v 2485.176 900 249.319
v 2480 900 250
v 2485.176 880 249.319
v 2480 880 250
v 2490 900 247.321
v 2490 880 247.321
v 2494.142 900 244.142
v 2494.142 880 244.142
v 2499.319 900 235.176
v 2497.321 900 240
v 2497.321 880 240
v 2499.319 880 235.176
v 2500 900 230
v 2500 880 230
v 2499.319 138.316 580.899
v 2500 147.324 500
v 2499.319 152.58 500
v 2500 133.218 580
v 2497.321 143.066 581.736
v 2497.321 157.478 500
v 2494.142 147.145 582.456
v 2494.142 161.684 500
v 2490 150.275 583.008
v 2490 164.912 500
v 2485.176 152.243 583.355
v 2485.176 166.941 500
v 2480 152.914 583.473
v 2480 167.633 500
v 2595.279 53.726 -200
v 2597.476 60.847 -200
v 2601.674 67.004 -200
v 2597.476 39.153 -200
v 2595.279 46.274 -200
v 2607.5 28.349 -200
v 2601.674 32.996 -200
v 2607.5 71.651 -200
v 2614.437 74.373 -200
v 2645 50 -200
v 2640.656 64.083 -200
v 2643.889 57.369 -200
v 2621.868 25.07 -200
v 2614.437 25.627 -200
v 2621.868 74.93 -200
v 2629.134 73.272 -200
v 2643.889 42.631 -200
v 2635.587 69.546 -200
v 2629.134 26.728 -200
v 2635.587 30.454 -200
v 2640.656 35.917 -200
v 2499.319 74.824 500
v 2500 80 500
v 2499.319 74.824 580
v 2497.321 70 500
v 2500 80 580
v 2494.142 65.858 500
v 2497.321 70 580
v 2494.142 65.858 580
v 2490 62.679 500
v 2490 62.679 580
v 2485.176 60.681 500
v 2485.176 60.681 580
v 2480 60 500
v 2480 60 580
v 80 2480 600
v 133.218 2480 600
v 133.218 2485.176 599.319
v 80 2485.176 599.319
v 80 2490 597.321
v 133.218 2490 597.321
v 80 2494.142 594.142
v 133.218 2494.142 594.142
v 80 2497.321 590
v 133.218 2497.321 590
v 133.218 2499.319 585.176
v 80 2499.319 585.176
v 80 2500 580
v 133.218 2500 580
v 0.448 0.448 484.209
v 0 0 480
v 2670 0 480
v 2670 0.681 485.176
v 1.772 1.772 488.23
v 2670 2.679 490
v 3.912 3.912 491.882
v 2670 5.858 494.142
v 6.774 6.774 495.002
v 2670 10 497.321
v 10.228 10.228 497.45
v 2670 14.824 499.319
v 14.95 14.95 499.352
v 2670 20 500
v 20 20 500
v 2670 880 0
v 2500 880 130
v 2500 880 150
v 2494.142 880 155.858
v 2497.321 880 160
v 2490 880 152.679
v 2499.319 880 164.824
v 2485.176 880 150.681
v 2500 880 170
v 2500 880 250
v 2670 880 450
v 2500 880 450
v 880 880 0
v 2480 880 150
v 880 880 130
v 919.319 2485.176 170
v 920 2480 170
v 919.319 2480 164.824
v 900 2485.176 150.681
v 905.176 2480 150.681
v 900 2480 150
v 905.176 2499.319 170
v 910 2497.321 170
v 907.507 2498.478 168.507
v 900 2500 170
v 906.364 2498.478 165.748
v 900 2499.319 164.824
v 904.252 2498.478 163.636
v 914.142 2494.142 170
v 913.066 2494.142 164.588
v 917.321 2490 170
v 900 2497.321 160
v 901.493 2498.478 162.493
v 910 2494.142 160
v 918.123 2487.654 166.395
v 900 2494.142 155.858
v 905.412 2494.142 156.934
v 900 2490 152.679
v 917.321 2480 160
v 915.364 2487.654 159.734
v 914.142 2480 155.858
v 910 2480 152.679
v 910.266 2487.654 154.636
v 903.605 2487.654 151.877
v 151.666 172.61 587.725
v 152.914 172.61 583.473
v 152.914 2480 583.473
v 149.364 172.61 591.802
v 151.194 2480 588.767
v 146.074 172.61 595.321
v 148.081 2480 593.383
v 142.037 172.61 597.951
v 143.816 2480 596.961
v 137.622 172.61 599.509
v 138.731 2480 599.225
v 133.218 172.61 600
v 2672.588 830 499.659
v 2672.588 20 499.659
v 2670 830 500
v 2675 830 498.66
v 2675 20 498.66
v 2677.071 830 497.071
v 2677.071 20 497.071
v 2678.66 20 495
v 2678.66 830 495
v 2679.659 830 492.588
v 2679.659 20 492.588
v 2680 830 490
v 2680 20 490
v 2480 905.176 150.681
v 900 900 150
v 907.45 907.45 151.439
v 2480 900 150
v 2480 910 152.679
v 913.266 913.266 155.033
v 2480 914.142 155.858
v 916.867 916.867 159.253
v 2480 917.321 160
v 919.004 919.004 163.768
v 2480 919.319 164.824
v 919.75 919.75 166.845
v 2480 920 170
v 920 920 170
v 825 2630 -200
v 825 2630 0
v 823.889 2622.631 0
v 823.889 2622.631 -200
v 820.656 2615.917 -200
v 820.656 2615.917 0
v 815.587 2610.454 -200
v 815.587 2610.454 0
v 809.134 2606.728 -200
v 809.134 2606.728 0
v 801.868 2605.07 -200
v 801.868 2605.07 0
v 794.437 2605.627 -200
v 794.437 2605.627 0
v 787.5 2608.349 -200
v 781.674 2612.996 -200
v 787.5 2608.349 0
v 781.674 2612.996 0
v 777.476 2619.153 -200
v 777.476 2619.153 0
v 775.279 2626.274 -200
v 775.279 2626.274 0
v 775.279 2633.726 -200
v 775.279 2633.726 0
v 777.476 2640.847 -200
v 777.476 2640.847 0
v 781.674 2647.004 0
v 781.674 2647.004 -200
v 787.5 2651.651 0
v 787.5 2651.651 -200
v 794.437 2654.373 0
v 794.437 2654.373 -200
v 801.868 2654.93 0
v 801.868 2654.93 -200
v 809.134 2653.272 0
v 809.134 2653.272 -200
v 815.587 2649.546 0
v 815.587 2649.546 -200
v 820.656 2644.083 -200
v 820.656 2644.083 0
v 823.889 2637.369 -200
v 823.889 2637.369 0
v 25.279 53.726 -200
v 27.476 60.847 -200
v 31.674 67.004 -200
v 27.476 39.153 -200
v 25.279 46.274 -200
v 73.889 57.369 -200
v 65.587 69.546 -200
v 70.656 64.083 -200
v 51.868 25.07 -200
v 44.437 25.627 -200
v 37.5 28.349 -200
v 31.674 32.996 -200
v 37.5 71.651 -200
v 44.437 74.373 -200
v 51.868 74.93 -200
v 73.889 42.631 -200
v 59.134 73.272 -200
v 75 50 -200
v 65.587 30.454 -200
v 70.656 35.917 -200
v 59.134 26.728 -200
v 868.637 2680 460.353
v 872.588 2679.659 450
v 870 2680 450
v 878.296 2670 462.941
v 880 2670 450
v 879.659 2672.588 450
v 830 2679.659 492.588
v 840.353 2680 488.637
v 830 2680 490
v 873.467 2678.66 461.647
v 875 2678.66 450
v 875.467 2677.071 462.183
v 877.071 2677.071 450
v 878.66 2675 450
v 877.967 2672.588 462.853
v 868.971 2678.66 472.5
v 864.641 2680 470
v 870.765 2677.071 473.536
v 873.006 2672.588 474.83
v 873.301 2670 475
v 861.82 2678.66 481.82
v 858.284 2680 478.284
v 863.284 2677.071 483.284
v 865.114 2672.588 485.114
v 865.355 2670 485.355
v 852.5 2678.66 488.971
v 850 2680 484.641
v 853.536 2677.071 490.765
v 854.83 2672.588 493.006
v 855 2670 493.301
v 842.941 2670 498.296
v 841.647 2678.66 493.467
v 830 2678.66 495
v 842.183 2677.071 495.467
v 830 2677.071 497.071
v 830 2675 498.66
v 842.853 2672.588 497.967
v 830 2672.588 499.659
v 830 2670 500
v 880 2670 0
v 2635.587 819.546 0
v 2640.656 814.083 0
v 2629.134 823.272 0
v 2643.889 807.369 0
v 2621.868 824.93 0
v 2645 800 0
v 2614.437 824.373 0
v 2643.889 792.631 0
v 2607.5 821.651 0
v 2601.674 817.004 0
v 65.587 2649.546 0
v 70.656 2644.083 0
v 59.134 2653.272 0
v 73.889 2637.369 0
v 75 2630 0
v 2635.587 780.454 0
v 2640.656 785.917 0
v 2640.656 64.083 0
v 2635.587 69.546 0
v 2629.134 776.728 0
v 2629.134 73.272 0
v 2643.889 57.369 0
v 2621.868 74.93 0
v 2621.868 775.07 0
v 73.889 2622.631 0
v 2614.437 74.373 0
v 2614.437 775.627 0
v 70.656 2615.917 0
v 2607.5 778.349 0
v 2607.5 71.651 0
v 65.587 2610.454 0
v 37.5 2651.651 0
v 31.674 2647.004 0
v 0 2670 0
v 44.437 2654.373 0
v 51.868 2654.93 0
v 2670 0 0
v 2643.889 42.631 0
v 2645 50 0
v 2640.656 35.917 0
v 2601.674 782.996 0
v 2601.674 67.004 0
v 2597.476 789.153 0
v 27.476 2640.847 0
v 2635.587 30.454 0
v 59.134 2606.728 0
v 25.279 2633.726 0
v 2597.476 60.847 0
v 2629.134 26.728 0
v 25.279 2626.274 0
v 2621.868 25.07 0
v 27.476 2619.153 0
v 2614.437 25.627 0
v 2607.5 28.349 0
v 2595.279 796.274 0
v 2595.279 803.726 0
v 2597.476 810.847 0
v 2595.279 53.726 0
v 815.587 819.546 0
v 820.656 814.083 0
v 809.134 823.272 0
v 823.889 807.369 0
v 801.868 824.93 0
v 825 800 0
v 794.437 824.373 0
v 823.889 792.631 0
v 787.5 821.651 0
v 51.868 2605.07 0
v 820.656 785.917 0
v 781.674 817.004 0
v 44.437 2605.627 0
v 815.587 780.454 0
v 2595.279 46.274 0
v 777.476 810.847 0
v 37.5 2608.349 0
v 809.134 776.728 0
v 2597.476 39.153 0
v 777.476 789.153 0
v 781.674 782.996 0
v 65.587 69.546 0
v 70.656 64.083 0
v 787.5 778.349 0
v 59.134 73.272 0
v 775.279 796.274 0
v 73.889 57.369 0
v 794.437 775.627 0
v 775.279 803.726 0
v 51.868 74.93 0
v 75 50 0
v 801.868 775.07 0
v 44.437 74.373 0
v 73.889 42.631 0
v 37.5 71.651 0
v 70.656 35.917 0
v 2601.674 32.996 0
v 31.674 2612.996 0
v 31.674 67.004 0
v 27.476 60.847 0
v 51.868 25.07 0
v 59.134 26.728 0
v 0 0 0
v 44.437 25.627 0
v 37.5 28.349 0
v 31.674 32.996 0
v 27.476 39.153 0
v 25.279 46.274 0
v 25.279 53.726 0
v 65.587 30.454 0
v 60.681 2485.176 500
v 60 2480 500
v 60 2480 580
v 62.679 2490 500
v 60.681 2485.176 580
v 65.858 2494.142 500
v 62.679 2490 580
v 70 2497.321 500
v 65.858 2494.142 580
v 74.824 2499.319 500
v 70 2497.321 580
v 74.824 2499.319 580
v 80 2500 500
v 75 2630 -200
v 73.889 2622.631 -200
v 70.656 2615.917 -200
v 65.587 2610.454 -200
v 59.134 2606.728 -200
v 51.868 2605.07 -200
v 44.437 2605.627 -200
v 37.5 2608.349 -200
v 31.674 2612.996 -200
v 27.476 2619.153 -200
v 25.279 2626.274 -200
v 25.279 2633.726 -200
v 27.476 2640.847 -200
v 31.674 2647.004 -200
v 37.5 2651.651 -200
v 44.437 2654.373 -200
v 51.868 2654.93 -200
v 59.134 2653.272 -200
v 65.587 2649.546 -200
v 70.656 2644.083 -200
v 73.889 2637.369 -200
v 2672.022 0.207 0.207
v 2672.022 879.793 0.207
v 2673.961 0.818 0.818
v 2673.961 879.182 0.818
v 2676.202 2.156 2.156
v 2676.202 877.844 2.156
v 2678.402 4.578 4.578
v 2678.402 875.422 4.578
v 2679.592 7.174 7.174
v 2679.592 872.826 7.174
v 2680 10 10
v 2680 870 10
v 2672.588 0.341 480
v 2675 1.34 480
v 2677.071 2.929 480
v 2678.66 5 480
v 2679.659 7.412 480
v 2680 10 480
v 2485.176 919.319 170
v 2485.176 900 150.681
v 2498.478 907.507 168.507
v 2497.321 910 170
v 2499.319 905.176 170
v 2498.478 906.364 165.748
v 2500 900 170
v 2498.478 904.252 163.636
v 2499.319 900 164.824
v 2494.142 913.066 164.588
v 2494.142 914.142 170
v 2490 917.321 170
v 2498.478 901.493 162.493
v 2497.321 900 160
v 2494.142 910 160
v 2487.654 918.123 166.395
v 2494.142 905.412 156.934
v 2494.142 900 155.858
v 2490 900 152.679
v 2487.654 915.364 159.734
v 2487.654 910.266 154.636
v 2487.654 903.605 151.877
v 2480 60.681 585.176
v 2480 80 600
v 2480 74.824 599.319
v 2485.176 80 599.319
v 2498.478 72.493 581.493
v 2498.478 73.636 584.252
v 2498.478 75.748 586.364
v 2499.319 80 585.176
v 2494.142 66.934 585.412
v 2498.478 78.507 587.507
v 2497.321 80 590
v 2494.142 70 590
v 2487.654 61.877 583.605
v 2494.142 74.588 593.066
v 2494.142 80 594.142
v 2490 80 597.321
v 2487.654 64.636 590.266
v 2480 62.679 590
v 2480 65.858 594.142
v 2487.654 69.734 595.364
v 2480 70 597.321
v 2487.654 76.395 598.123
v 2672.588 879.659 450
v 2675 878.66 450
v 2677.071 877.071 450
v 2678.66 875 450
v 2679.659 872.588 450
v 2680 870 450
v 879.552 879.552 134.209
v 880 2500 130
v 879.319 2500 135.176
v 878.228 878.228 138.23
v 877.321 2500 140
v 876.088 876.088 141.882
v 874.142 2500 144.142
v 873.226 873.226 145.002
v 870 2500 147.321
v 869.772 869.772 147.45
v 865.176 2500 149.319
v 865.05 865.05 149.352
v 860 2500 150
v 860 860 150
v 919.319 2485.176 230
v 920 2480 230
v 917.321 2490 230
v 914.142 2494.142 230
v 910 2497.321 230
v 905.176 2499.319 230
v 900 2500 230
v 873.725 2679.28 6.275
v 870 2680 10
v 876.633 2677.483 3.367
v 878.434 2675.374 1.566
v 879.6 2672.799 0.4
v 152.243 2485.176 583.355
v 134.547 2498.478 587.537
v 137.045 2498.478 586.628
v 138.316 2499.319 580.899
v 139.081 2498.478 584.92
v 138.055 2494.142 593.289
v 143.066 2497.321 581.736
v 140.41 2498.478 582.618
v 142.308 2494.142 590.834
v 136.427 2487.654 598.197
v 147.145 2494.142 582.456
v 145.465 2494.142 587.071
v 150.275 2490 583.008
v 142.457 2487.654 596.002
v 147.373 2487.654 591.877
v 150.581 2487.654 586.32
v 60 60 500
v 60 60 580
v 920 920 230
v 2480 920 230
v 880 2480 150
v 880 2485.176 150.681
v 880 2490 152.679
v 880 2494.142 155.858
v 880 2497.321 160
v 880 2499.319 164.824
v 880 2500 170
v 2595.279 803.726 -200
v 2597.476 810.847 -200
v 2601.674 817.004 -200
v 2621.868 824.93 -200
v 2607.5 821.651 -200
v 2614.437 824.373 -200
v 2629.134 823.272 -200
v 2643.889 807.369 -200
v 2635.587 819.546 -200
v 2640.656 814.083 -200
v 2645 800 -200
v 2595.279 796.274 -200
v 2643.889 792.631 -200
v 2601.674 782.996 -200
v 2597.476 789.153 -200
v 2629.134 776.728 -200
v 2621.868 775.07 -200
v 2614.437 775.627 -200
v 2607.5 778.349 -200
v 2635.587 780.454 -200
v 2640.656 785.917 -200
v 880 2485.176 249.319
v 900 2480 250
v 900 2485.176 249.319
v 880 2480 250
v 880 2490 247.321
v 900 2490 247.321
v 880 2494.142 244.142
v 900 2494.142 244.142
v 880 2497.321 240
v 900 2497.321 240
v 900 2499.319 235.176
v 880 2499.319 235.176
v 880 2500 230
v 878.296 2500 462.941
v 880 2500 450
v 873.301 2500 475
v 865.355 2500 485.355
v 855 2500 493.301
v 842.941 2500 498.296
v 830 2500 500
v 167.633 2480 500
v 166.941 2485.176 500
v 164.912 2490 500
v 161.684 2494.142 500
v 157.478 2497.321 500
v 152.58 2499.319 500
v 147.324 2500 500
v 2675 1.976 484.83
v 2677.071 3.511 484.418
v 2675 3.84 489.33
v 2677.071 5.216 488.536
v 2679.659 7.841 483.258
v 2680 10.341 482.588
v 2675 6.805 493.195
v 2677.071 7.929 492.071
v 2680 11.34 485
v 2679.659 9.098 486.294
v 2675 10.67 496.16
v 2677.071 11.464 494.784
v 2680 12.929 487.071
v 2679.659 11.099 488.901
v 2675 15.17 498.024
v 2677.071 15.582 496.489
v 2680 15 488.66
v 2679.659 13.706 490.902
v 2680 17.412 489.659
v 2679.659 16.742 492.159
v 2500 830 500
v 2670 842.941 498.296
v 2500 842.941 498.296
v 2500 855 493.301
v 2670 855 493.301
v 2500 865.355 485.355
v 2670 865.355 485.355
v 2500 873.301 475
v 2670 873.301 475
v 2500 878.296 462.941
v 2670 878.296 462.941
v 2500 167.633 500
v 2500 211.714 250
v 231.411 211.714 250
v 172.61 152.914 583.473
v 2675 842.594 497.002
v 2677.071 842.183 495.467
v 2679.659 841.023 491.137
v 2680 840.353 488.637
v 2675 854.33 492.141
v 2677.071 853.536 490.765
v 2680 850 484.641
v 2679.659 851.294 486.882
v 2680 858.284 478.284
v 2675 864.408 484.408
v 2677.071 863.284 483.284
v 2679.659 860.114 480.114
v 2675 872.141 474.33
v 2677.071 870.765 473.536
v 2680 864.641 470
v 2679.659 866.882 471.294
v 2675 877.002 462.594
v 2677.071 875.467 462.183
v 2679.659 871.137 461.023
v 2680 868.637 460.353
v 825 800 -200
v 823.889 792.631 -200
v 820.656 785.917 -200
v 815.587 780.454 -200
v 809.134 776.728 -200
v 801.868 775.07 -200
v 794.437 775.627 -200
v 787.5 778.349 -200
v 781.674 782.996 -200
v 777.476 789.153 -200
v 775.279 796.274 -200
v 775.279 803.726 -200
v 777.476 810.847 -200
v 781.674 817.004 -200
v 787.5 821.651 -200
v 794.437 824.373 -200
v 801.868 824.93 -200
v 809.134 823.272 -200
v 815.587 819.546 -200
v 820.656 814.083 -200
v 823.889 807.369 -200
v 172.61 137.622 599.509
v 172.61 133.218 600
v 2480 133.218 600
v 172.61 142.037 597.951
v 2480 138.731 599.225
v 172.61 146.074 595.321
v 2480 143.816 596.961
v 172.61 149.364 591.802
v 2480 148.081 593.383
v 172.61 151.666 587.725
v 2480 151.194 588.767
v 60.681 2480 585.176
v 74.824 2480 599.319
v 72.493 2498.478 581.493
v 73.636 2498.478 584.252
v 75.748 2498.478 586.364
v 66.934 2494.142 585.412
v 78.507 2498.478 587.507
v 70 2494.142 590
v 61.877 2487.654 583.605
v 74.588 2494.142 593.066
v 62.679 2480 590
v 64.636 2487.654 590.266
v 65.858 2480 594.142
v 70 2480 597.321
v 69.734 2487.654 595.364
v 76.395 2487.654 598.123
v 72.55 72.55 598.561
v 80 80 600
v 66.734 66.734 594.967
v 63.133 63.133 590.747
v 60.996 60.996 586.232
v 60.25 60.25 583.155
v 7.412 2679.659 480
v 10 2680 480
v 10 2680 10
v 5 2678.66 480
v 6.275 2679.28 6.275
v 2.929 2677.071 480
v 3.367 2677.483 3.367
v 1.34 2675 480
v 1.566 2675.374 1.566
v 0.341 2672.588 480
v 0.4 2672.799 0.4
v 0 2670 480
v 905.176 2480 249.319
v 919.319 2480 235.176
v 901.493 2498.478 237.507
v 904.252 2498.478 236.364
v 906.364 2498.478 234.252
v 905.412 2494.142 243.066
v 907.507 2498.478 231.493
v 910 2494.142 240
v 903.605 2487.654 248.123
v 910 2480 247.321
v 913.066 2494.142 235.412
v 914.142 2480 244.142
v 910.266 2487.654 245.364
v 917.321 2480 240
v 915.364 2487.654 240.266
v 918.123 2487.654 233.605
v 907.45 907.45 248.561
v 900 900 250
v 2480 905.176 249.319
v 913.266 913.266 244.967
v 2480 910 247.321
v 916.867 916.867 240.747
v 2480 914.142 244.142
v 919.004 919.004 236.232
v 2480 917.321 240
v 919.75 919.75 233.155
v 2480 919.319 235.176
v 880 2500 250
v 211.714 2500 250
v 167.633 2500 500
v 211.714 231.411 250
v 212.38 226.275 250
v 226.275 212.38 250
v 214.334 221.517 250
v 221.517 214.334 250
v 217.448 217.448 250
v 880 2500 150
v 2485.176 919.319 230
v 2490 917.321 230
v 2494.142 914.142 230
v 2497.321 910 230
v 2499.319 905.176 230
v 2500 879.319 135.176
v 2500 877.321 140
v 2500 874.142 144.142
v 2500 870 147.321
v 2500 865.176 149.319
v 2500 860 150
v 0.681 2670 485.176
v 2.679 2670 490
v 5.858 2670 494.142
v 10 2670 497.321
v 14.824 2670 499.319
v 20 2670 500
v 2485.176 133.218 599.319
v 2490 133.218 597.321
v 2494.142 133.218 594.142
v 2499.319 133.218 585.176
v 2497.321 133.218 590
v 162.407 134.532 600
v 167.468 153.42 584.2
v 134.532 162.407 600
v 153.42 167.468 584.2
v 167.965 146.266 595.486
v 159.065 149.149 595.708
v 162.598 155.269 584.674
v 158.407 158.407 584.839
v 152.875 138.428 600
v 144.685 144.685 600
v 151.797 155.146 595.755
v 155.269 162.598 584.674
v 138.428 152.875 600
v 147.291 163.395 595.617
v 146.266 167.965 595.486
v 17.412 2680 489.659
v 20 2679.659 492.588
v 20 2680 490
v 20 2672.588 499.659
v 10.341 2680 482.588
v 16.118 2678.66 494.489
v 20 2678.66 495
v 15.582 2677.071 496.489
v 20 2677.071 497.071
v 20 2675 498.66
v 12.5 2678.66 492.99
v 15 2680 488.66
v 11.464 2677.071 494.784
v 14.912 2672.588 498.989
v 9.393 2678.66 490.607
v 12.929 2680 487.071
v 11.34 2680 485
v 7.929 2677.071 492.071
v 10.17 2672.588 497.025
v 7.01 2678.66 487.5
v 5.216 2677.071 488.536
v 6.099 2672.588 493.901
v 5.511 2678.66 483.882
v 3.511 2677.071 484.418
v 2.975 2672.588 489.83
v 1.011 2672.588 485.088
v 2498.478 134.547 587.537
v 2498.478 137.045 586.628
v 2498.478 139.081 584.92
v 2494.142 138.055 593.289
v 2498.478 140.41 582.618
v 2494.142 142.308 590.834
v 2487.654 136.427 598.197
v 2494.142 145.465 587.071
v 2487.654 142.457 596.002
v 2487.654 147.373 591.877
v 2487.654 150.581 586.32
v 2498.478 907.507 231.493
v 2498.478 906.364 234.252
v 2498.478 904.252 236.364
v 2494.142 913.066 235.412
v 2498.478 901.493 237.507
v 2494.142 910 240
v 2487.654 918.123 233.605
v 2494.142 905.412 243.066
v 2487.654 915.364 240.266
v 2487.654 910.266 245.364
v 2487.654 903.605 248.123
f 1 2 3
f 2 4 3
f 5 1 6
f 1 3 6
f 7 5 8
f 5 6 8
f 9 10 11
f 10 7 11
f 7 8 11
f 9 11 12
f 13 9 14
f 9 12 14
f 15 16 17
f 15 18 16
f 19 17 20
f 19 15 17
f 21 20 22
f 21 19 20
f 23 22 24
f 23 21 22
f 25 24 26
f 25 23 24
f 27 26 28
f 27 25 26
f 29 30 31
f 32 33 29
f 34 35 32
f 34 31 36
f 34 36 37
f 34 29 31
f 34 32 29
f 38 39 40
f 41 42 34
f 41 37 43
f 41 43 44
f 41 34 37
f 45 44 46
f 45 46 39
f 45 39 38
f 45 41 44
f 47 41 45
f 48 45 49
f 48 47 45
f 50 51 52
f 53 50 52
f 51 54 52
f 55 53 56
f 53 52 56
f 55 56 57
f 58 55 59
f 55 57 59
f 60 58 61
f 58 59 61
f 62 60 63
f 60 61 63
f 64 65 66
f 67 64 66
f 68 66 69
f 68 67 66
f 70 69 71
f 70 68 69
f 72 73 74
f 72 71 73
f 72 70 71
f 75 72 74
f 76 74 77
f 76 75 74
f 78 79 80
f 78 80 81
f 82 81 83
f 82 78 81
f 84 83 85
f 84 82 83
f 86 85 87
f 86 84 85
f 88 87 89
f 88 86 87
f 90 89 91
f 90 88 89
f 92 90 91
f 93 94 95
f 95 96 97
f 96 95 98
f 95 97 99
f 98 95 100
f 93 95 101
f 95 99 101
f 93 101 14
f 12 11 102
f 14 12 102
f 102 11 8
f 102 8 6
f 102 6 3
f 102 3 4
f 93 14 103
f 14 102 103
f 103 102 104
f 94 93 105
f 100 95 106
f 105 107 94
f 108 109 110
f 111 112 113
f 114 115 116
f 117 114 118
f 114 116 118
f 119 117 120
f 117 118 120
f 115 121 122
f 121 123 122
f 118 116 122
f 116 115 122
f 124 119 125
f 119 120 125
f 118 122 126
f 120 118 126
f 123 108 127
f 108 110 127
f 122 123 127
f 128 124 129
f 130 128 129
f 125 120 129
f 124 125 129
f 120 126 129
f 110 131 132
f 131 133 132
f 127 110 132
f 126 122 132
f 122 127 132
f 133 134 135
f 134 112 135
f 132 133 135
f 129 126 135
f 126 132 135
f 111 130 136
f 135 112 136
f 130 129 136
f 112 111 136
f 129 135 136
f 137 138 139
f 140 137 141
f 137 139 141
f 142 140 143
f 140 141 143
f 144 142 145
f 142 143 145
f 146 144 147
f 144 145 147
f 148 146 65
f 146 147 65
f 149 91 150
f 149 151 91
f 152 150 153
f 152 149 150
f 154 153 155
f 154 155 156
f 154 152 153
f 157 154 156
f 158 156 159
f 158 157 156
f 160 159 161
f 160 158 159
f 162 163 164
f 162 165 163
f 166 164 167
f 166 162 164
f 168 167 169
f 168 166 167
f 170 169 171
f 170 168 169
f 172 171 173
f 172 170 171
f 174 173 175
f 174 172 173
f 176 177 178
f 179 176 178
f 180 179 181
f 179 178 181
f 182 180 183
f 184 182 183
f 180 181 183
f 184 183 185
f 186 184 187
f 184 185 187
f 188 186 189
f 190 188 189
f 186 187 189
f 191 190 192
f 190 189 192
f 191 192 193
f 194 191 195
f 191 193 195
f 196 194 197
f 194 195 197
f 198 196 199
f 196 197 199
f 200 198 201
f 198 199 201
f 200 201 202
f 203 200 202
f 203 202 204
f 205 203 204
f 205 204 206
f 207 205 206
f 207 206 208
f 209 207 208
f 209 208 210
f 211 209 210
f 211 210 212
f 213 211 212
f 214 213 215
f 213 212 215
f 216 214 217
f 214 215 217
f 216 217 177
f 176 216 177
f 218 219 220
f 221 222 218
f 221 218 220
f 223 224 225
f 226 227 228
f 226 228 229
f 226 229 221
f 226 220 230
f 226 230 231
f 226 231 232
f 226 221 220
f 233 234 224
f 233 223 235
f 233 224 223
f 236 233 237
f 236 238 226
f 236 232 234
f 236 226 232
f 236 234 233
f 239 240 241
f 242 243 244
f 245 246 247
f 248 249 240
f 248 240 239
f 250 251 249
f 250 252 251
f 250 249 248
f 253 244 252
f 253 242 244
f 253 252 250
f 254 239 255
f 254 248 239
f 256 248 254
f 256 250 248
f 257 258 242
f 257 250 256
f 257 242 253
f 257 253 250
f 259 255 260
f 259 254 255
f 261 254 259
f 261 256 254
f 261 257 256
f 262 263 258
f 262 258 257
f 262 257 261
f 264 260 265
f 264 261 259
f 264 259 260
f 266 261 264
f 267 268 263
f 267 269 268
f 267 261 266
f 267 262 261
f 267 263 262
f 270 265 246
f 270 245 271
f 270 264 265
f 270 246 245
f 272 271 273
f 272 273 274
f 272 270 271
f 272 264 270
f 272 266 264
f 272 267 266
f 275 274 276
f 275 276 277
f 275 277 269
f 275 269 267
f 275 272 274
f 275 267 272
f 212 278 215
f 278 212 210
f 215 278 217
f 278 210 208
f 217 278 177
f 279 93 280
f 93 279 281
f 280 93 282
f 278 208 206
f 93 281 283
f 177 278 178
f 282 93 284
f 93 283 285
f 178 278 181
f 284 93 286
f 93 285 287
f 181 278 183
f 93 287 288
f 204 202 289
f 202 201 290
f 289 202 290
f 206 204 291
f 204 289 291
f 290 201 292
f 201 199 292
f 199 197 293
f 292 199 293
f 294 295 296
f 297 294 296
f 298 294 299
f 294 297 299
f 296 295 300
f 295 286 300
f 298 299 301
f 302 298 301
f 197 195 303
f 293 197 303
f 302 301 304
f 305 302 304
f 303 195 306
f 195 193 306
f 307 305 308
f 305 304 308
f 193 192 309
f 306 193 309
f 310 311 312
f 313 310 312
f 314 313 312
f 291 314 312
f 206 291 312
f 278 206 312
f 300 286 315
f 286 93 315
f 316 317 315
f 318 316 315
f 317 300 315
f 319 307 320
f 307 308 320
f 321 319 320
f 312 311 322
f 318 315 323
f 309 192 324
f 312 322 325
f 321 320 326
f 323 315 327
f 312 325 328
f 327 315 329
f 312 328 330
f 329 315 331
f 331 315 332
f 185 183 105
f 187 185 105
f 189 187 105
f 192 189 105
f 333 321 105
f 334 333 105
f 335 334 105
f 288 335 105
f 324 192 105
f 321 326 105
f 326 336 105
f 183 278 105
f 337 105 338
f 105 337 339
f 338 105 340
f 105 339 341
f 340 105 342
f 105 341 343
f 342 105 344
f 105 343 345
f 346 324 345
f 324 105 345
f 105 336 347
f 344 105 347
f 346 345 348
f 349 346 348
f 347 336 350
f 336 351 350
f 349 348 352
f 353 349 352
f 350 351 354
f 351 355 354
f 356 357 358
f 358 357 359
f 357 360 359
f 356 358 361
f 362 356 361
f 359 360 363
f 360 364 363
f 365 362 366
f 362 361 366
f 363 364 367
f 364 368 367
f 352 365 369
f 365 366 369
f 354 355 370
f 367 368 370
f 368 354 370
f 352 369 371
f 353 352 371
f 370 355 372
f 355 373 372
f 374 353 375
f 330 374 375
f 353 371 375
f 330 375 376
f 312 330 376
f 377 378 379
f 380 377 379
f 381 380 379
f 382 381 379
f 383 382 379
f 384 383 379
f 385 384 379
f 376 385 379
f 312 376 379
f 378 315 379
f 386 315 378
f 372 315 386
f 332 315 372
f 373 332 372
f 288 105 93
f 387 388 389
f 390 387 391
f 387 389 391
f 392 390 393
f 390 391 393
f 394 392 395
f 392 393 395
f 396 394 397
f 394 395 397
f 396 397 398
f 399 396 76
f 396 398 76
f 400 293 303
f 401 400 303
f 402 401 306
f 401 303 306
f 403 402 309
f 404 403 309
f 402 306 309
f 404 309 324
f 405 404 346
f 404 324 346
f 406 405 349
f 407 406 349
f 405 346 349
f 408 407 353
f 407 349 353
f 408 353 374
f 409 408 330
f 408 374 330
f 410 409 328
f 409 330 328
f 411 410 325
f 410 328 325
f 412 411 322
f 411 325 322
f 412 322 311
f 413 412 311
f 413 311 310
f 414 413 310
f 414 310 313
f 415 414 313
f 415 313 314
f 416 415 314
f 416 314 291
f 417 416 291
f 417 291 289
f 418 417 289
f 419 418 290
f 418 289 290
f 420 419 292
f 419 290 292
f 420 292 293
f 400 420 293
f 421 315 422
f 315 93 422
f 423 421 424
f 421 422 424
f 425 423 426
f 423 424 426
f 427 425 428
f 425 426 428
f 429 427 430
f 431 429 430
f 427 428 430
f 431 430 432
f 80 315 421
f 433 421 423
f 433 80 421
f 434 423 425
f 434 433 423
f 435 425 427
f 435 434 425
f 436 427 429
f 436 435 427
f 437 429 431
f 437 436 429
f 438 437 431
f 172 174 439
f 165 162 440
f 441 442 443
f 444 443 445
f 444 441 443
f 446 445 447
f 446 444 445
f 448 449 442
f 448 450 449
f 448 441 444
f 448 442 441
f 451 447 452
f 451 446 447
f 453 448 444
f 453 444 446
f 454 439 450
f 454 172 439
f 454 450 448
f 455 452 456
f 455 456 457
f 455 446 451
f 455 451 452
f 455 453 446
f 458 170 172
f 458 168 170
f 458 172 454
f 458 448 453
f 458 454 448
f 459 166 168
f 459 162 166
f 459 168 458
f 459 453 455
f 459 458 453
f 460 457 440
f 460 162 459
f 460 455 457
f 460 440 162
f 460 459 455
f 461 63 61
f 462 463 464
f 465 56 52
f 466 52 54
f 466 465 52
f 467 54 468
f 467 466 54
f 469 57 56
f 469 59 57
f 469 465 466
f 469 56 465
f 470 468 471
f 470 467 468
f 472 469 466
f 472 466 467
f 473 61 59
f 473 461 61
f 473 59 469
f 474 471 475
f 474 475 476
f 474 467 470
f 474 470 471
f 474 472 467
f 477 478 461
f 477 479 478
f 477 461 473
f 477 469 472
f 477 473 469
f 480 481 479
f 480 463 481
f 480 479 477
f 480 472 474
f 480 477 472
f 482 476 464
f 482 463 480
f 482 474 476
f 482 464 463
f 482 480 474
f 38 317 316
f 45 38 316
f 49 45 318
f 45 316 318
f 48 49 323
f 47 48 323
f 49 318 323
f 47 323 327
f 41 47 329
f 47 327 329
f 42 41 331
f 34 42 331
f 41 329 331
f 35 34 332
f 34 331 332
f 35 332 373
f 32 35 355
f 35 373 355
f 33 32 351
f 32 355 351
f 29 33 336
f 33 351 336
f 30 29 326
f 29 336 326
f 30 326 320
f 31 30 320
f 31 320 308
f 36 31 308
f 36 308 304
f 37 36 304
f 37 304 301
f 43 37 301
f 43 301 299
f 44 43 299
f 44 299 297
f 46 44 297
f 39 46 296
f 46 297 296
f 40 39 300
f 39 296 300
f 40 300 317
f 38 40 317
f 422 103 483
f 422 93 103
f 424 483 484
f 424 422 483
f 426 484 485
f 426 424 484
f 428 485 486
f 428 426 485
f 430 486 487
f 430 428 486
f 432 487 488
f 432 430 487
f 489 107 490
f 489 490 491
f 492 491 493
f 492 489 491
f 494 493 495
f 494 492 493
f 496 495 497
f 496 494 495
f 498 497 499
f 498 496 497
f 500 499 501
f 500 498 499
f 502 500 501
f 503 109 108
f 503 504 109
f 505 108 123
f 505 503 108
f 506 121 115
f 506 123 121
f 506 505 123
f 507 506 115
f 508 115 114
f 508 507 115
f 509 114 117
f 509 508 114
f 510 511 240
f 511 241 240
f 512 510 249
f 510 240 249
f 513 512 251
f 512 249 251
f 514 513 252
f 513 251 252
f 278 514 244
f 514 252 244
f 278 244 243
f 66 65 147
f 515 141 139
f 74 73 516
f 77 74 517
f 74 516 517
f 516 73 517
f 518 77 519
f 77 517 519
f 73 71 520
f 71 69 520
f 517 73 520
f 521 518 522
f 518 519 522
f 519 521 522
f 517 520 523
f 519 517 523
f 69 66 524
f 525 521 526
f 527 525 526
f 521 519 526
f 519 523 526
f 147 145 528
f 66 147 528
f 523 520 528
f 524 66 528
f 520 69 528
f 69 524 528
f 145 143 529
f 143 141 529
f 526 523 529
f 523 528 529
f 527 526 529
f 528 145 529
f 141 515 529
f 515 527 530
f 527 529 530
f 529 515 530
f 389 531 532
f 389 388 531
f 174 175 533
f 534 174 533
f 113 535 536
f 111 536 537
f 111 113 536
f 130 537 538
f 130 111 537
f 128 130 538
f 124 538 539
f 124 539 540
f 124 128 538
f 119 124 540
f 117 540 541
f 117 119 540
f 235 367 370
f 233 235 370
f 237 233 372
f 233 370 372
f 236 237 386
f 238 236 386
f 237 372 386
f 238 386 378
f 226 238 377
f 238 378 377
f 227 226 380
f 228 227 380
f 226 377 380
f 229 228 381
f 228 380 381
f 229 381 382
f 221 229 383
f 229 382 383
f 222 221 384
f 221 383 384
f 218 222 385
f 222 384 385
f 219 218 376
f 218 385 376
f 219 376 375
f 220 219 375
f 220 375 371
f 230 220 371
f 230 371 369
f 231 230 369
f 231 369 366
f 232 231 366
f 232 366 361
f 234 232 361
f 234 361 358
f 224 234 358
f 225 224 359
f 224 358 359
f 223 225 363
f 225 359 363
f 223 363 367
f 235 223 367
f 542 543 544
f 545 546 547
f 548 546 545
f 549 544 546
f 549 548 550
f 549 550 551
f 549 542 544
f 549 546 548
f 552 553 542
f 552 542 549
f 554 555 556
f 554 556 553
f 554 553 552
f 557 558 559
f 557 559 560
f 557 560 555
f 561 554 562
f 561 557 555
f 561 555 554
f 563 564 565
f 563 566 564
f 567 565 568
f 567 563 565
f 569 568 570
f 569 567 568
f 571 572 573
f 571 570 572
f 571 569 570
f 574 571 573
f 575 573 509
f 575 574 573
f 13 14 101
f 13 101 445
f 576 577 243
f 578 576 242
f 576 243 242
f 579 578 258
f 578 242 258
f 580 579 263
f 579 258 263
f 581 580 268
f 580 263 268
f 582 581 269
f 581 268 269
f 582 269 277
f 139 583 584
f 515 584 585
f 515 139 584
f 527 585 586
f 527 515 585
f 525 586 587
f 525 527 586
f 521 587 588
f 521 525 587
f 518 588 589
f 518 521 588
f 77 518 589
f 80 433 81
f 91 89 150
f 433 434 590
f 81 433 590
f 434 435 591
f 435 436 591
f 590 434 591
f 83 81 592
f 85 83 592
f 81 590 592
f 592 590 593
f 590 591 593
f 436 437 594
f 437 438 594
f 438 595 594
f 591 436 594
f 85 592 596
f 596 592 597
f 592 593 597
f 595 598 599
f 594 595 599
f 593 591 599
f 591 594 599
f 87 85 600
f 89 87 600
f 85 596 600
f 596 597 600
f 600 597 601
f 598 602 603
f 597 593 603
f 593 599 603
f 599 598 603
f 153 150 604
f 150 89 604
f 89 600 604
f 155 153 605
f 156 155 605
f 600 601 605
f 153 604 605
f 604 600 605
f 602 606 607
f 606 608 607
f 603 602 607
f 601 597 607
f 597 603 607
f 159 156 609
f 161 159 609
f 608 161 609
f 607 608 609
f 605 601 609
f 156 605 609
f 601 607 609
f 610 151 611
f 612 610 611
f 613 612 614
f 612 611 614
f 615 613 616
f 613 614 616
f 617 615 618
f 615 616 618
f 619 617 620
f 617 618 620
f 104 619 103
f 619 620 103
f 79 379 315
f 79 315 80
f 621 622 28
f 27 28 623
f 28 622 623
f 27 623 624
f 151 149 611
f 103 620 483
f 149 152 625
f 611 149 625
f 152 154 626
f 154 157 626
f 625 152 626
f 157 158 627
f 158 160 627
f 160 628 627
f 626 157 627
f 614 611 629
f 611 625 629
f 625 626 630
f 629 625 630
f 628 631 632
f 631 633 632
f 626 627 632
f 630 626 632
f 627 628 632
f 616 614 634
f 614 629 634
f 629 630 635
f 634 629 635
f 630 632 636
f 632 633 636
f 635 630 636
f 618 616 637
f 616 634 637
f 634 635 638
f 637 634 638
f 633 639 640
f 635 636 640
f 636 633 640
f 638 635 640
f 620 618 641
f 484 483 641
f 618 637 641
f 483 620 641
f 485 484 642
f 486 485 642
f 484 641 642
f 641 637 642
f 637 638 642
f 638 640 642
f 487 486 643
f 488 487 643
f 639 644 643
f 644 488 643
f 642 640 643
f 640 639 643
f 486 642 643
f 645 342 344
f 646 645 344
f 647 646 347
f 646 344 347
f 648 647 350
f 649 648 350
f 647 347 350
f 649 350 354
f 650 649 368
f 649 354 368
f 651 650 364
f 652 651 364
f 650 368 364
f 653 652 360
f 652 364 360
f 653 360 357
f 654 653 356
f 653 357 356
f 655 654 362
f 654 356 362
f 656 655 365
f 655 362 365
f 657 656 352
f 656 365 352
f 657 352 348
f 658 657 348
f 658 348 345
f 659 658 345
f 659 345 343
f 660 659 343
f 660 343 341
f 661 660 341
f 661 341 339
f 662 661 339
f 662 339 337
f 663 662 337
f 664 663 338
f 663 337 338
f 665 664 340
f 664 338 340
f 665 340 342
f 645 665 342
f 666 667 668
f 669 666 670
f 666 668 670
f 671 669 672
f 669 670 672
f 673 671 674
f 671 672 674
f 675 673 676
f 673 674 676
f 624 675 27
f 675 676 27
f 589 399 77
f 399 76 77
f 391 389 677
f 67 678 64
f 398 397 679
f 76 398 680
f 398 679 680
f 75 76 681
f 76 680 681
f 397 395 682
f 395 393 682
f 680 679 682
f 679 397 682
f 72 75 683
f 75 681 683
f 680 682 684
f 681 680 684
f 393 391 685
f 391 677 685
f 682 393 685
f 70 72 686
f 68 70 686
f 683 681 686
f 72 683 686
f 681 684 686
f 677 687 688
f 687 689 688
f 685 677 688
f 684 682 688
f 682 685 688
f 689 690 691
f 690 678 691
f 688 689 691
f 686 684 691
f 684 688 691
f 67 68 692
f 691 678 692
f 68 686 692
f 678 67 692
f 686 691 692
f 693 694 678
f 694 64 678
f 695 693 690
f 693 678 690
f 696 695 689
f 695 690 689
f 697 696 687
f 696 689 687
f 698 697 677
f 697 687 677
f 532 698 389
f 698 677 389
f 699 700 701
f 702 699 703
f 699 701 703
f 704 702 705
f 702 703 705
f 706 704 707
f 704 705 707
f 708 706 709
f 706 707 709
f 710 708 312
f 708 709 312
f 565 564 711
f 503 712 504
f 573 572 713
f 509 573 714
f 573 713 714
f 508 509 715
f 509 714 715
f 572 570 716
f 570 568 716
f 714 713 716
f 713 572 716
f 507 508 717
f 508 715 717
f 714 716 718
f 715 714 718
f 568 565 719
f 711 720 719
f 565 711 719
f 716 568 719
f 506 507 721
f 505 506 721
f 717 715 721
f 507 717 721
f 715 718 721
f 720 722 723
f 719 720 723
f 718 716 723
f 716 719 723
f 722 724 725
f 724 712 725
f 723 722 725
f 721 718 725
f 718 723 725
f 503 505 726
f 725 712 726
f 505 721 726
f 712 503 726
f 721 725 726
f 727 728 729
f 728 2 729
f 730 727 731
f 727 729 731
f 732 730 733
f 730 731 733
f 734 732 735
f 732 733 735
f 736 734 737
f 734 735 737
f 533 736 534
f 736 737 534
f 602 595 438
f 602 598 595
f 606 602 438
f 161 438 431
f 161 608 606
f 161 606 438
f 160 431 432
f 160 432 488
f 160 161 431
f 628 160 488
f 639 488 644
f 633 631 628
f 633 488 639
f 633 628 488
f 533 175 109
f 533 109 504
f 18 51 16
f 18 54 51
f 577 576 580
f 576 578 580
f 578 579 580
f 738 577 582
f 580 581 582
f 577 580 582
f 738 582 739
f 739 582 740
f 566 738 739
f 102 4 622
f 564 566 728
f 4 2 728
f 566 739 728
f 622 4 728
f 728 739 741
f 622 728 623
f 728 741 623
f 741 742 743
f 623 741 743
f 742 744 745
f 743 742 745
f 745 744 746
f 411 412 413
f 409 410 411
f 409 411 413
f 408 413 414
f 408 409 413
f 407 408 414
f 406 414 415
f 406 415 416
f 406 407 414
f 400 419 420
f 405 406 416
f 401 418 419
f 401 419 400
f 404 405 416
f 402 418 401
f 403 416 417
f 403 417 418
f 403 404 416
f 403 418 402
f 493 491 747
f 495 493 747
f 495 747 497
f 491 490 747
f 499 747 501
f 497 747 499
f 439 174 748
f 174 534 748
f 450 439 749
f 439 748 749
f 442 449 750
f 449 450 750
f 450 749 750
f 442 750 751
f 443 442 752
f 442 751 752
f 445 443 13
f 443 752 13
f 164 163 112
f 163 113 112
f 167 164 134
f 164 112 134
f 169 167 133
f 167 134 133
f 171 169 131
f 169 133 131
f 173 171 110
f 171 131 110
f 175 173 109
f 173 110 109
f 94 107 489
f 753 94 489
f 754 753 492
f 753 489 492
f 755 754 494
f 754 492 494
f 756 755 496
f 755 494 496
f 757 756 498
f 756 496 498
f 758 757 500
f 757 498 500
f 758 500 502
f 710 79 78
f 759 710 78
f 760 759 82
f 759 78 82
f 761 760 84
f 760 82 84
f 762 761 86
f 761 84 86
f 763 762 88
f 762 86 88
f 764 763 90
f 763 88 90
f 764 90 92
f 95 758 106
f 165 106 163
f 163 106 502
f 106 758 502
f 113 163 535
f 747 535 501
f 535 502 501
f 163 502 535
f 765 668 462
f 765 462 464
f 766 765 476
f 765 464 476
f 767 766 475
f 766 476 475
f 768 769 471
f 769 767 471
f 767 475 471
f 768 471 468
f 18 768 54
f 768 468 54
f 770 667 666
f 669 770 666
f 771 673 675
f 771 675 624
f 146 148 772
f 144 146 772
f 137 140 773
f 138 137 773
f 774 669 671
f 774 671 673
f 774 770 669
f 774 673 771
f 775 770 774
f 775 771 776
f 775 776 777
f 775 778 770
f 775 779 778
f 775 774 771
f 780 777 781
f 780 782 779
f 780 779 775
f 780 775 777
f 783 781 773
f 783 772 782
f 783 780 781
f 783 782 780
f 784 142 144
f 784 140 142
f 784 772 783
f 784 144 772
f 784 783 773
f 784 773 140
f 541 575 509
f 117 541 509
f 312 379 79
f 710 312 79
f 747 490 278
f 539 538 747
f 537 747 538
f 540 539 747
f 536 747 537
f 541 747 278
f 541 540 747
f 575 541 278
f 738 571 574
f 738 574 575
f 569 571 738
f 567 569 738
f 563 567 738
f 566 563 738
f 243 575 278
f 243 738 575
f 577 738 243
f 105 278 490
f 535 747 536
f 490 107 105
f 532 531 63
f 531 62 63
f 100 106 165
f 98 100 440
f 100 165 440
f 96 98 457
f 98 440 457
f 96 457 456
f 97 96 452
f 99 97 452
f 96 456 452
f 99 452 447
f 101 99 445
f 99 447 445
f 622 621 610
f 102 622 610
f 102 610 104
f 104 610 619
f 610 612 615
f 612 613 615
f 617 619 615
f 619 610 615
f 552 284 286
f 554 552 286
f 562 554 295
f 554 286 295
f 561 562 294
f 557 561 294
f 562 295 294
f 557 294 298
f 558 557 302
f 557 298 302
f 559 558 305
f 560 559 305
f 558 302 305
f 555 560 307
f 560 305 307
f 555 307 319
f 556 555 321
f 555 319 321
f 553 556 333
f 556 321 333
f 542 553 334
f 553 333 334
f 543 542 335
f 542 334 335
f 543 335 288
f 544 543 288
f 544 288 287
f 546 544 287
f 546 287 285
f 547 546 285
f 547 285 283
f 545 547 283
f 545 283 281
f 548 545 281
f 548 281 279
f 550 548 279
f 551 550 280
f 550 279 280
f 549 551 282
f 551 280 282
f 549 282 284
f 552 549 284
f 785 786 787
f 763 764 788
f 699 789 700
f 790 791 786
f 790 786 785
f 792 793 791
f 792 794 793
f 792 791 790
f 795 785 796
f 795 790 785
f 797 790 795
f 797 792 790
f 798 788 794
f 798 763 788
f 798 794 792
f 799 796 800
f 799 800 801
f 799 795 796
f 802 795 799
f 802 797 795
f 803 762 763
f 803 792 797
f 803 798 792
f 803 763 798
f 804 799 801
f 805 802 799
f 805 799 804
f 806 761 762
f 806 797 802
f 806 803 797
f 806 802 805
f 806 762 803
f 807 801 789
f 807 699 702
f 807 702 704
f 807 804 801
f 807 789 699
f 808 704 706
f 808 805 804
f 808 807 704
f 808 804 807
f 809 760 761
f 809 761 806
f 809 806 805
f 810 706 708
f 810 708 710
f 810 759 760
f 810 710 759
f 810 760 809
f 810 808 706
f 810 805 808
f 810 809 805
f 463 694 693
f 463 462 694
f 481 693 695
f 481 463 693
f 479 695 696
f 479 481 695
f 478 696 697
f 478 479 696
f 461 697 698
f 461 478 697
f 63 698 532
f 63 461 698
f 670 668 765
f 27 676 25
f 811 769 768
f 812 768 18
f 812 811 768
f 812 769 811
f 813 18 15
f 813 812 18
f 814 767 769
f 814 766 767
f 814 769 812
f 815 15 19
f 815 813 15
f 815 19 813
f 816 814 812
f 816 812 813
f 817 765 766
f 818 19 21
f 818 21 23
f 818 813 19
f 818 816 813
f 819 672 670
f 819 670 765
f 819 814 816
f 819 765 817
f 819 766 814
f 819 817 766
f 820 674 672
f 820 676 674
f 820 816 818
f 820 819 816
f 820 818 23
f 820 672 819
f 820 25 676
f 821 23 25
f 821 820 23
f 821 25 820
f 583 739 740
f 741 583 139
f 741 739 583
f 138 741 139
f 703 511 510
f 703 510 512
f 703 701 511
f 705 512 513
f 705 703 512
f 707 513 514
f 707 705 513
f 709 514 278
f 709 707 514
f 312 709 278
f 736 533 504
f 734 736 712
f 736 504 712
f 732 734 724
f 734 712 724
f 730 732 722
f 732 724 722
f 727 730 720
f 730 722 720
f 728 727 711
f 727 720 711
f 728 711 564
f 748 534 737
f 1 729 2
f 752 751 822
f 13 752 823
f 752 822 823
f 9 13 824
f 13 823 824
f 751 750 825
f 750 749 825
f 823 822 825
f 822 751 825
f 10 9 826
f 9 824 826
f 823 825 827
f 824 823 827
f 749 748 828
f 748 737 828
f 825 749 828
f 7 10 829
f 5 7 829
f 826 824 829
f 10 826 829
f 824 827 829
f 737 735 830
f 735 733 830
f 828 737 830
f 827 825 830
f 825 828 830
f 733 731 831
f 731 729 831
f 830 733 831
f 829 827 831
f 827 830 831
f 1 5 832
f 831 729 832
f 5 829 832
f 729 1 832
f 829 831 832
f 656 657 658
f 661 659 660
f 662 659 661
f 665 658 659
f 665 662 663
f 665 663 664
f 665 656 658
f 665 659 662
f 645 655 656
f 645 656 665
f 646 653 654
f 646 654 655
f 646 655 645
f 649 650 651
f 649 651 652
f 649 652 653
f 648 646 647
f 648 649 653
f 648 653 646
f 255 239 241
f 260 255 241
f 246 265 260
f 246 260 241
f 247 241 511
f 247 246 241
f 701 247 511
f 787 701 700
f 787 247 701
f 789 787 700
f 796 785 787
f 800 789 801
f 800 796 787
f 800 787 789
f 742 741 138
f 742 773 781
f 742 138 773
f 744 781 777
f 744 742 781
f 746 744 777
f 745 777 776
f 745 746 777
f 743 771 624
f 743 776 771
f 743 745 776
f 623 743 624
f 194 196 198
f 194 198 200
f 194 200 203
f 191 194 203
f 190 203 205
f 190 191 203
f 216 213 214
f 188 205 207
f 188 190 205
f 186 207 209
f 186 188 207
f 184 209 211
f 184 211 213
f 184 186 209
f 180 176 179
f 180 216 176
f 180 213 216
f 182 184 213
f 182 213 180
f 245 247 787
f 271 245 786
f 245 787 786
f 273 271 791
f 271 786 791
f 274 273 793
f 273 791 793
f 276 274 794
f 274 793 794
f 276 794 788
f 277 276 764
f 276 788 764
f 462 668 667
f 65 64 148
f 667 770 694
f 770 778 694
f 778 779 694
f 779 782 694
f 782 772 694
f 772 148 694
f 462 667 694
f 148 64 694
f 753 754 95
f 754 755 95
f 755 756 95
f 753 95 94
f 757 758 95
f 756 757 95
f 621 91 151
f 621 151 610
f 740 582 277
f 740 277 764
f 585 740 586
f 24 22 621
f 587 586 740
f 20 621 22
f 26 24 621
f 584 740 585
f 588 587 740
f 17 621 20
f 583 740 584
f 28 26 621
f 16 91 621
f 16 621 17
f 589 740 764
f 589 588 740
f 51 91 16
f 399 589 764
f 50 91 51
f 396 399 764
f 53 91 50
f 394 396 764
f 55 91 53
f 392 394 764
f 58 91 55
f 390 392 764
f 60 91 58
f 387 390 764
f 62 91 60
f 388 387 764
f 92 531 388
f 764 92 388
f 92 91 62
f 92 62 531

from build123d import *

# Parameters (mm, degrees)
F1_DEPTH  = 2500
F3_DEPTH  = 2500
F4_W      = 160
F4_H      = 150
F5_DEPTH  = 2500.001
F6_W      = 150
F6_H      = 150
F7_DEPTH  = 2500.001
F8_W      = 880
F8_H      = 500
F9_DEPTH  = 180
F10_W     = 880
F10_H     = 500
F11_DEPTH = 180
F12_R     = 20
F13_R     = 50
F14_R     = 10
F15_R     = 25
F16_DEPTH = 200


with BuildPart() as f1:
    # F0 (on Front) → F1 (new body)
    with BuildSketch(Plane.XZ):
        with BuildLine():
            Line((0, 600), (0, 0))
            Line((0, 0), (880, 0))
            Line((880, 0), (880, 130))
            ThreePointArc((880, 130), (874.1421356237, 144.1421356237), (860, 150))
            Line((860, 150), (920, 150))
            Line((920, 150), (920, 250))
            Line((920, 250), (211.714443248, 250))
            Line((211.714443248, 250), (150, 600))
            Line((150, 600), (0, 600))
        make_face()
    extrude(amount=-F1_DEPTH)

    # F2 (on Right) → F3 (join)
    with BuildSketch(Plane.YZ):
        with BuildLine():
            Line((0, 600), (0, 0))
            Line((0, 0), (880, 0))
            Line((880, 0), (880, 130))
            ThreePointArc((880, 130), (874.1421356237, 144.1421356237), (860, 150))
            Line((860, 150), (920, 150))
            Line((920, 150), (920, 250))
            Line((920, 250), (211.714443248, 250))
            Line((211.714443248, 250), (150, 600))
            Line((150, 600), (0, 600))
        make_face()
    extrude(amount=F3_DEPTH)

    # F4 (on face) → F5 (cut, through all)
    with BuildSketch(Plane.YZ.offset(2500)):
        with Locations((-20, 575)):
            Rectangle(F4_W, F4_H)
    extrude(amount=-F5_DEPTH, mode=Mode.SUBTRACT)

    # F6 (on face) → F7 (cut, through all)
    with BuildSketch(Plane(origin=(0, 2500, 0), x_dir=(-1, 0, 0), z_dir=(0, 1, 0))):
        with Locations((15, 575)):
            Rectangle(F6_W, F6_H)
    extrude(amount=-F7_DEPTH, mode=Mode.SUBTRACT)

    # F8 (on face) → F9 (join)
    with BuildSketch(Plane.YZ.offset(2500)):
        with Locations((440, 250)):
            Rectangle(F8_W, F8_H)
    extrude(amount=F9_DEPTH)

    # F10 (on face) → F11 (join)
    with BuildSketch(Plane(origin=(0, 2500, 0), x_dir=(-1, 0, 0), z_dir=(0, 1, 0))):
        with Locations((-440, 250)):
            Rectangle(F10_W, F10_H)
    extrude(amount=F11_DEPTH)

    # F12
    f12_edges = [f1.edges().sort_by_distance(p)[0] for p in [
        (1325, 150, 600),
        (1280, 60, 600),
        (1710, 920, 250),
        (920, 1710, 250),
        (1710, 920, 150),
        (920, 1710, 150),
        (150, 1325, 600),
        (60, 1280, 600),
        (1340, 0, 500),
        (0, 1340, 500),
        (2500, 920, 200),
        (2500, 900, 250),
        (2500, 900, 150),
        (900, 2500, 250),
        (920, 2500, 200),
        (900, 2500, 150),
        (60, 2500, 550),
        (105, 2500, 600),
        (158.816349, 2500, 550),
        (2500, 60, 550),
        (2500, 105, 600),
        (2500, 158.816349, 550),
        (180.857222, 180.857222, 425),
    ]]
    fillet(f12_edges, radius=F12_R)

    # F13
    f13_edges = [f1.edges().sort_by_distance(p)[0] for p in [
        (2590, 880, 500),
        (880, 2590, 500),
    ]]
    fillet(f13_edges, radius=F13_R)

    # F14
    f14_edges = [f1.edges().sort_by_distance(p)[0] for p in [
        (2680, 425, 500),
        (2680, 865.355339, 485.355339),
        (2680, 5.857864, 494.142136),
        (2680, 880, 225),
        (2680, 0, 240),
        (2680, 440, 0),
        (425, 2680, 500),
        (865.355339, 2680, 485.355339),
        (5.857864, 2680, 494.142136),
        (880, 2680, 225),
        (0, 2680, 240),
        (440, 2680, 0),
    ]]
    fillet(f14_edges, radius=F14_R)

    # F15 (on face) → F16 (join)
    with BuildSketch(Plane(origin=(0, 0, 0), x_dir=(1, 0, 0), z_dir=(0, 0, -1))):
        with Locations((50, -2630)):
            Circle(F15_R)
        with Locations((50, -50)):
            Circle(F15_R)
        with Locations((800, -2630)):
            Circle(F15_R)
        with Locations((2620, -50)):
            Circle(F15_R)
        with Locations((2620, -800)):
            Circle(F15_R)
        with Locations((800, -800)):
            Circle(F15_R)
    extrude(amount=F16_DEPTH)


solid = f1.part
